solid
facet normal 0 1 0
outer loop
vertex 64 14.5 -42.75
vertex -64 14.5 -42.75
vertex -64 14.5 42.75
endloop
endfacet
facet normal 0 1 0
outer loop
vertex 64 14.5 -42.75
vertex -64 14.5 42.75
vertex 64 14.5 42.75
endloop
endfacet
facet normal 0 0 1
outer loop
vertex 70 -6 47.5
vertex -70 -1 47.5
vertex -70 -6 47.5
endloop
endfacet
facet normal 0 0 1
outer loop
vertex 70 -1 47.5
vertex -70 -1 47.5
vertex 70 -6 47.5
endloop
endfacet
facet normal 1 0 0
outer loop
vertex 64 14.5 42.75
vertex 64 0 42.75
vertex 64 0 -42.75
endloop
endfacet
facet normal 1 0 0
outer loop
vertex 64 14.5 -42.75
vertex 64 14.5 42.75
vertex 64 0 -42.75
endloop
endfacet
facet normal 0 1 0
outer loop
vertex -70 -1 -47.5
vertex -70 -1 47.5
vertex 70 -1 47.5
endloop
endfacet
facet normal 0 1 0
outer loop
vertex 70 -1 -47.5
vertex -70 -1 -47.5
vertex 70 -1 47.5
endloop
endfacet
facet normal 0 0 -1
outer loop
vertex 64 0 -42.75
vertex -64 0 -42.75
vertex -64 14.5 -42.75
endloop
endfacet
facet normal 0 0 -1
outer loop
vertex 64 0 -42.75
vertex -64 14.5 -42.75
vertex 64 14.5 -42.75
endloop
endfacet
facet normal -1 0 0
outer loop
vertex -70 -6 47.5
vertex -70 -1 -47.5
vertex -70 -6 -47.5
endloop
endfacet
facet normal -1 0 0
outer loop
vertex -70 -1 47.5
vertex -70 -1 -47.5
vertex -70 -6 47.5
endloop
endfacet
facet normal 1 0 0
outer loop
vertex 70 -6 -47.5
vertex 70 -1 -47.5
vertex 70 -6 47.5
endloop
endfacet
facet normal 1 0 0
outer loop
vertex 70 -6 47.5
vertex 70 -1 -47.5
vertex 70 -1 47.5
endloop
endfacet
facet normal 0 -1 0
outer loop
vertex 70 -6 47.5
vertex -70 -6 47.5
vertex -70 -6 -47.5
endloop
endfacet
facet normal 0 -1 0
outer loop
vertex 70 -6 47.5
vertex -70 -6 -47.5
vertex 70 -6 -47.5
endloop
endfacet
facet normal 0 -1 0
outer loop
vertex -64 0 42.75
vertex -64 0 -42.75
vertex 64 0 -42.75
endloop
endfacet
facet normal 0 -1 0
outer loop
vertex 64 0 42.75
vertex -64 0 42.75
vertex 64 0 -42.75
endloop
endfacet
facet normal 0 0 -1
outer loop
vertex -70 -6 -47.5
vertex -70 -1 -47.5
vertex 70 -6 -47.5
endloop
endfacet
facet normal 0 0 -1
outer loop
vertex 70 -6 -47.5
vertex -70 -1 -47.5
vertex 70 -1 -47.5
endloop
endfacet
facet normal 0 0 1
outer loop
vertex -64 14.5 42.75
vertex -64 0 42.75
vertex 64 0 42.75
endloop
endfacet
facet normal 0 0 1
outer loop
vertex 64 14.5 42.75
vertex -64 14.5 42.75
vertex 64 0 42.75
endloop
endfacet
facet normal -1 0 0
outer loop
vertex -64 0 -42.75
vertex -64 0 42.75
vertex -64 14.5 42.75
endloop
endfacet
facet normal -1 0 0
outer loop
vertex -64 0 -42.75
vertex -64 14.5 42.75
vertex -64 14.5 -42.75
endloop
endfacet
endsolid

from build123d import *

# Parameters (mm, degrees)
SKETCH1_W           = 128
SKETCH1_H           = 85.5
BOSS_EXTRUDE1_DEPTH = 14.5
SKETCH3_W           = 140
SKETCH3_H           = 95
BOSS_EXTRUDE3_DEPTH = 5


with BuildPart() as part:
    # Sketch1 → Boss-Extrude1 (new body)
    with BuildSketch(Plane(origin=(0, 0, 0), x_dir=(1, 0, 0), z_dir=(0, 1, 0))):
        Rectangle(SKETCH1_W, SKETCH1_H)
    extrude(amount=BOSS_EXTRUDE1_DEPTH)


with BuildPart() as body_2:
    # Sketch3 → Boss-Extrude3 (new body)
    with BuildSketch(Plane.XZ.offset(1)):
        Rectangle(SKETCH3_W, SKETCH3_H)
    extrude(amount=BOSS_EXTRUDE3_DEPTH)


solid = Compound([part.part, body_2.part])
